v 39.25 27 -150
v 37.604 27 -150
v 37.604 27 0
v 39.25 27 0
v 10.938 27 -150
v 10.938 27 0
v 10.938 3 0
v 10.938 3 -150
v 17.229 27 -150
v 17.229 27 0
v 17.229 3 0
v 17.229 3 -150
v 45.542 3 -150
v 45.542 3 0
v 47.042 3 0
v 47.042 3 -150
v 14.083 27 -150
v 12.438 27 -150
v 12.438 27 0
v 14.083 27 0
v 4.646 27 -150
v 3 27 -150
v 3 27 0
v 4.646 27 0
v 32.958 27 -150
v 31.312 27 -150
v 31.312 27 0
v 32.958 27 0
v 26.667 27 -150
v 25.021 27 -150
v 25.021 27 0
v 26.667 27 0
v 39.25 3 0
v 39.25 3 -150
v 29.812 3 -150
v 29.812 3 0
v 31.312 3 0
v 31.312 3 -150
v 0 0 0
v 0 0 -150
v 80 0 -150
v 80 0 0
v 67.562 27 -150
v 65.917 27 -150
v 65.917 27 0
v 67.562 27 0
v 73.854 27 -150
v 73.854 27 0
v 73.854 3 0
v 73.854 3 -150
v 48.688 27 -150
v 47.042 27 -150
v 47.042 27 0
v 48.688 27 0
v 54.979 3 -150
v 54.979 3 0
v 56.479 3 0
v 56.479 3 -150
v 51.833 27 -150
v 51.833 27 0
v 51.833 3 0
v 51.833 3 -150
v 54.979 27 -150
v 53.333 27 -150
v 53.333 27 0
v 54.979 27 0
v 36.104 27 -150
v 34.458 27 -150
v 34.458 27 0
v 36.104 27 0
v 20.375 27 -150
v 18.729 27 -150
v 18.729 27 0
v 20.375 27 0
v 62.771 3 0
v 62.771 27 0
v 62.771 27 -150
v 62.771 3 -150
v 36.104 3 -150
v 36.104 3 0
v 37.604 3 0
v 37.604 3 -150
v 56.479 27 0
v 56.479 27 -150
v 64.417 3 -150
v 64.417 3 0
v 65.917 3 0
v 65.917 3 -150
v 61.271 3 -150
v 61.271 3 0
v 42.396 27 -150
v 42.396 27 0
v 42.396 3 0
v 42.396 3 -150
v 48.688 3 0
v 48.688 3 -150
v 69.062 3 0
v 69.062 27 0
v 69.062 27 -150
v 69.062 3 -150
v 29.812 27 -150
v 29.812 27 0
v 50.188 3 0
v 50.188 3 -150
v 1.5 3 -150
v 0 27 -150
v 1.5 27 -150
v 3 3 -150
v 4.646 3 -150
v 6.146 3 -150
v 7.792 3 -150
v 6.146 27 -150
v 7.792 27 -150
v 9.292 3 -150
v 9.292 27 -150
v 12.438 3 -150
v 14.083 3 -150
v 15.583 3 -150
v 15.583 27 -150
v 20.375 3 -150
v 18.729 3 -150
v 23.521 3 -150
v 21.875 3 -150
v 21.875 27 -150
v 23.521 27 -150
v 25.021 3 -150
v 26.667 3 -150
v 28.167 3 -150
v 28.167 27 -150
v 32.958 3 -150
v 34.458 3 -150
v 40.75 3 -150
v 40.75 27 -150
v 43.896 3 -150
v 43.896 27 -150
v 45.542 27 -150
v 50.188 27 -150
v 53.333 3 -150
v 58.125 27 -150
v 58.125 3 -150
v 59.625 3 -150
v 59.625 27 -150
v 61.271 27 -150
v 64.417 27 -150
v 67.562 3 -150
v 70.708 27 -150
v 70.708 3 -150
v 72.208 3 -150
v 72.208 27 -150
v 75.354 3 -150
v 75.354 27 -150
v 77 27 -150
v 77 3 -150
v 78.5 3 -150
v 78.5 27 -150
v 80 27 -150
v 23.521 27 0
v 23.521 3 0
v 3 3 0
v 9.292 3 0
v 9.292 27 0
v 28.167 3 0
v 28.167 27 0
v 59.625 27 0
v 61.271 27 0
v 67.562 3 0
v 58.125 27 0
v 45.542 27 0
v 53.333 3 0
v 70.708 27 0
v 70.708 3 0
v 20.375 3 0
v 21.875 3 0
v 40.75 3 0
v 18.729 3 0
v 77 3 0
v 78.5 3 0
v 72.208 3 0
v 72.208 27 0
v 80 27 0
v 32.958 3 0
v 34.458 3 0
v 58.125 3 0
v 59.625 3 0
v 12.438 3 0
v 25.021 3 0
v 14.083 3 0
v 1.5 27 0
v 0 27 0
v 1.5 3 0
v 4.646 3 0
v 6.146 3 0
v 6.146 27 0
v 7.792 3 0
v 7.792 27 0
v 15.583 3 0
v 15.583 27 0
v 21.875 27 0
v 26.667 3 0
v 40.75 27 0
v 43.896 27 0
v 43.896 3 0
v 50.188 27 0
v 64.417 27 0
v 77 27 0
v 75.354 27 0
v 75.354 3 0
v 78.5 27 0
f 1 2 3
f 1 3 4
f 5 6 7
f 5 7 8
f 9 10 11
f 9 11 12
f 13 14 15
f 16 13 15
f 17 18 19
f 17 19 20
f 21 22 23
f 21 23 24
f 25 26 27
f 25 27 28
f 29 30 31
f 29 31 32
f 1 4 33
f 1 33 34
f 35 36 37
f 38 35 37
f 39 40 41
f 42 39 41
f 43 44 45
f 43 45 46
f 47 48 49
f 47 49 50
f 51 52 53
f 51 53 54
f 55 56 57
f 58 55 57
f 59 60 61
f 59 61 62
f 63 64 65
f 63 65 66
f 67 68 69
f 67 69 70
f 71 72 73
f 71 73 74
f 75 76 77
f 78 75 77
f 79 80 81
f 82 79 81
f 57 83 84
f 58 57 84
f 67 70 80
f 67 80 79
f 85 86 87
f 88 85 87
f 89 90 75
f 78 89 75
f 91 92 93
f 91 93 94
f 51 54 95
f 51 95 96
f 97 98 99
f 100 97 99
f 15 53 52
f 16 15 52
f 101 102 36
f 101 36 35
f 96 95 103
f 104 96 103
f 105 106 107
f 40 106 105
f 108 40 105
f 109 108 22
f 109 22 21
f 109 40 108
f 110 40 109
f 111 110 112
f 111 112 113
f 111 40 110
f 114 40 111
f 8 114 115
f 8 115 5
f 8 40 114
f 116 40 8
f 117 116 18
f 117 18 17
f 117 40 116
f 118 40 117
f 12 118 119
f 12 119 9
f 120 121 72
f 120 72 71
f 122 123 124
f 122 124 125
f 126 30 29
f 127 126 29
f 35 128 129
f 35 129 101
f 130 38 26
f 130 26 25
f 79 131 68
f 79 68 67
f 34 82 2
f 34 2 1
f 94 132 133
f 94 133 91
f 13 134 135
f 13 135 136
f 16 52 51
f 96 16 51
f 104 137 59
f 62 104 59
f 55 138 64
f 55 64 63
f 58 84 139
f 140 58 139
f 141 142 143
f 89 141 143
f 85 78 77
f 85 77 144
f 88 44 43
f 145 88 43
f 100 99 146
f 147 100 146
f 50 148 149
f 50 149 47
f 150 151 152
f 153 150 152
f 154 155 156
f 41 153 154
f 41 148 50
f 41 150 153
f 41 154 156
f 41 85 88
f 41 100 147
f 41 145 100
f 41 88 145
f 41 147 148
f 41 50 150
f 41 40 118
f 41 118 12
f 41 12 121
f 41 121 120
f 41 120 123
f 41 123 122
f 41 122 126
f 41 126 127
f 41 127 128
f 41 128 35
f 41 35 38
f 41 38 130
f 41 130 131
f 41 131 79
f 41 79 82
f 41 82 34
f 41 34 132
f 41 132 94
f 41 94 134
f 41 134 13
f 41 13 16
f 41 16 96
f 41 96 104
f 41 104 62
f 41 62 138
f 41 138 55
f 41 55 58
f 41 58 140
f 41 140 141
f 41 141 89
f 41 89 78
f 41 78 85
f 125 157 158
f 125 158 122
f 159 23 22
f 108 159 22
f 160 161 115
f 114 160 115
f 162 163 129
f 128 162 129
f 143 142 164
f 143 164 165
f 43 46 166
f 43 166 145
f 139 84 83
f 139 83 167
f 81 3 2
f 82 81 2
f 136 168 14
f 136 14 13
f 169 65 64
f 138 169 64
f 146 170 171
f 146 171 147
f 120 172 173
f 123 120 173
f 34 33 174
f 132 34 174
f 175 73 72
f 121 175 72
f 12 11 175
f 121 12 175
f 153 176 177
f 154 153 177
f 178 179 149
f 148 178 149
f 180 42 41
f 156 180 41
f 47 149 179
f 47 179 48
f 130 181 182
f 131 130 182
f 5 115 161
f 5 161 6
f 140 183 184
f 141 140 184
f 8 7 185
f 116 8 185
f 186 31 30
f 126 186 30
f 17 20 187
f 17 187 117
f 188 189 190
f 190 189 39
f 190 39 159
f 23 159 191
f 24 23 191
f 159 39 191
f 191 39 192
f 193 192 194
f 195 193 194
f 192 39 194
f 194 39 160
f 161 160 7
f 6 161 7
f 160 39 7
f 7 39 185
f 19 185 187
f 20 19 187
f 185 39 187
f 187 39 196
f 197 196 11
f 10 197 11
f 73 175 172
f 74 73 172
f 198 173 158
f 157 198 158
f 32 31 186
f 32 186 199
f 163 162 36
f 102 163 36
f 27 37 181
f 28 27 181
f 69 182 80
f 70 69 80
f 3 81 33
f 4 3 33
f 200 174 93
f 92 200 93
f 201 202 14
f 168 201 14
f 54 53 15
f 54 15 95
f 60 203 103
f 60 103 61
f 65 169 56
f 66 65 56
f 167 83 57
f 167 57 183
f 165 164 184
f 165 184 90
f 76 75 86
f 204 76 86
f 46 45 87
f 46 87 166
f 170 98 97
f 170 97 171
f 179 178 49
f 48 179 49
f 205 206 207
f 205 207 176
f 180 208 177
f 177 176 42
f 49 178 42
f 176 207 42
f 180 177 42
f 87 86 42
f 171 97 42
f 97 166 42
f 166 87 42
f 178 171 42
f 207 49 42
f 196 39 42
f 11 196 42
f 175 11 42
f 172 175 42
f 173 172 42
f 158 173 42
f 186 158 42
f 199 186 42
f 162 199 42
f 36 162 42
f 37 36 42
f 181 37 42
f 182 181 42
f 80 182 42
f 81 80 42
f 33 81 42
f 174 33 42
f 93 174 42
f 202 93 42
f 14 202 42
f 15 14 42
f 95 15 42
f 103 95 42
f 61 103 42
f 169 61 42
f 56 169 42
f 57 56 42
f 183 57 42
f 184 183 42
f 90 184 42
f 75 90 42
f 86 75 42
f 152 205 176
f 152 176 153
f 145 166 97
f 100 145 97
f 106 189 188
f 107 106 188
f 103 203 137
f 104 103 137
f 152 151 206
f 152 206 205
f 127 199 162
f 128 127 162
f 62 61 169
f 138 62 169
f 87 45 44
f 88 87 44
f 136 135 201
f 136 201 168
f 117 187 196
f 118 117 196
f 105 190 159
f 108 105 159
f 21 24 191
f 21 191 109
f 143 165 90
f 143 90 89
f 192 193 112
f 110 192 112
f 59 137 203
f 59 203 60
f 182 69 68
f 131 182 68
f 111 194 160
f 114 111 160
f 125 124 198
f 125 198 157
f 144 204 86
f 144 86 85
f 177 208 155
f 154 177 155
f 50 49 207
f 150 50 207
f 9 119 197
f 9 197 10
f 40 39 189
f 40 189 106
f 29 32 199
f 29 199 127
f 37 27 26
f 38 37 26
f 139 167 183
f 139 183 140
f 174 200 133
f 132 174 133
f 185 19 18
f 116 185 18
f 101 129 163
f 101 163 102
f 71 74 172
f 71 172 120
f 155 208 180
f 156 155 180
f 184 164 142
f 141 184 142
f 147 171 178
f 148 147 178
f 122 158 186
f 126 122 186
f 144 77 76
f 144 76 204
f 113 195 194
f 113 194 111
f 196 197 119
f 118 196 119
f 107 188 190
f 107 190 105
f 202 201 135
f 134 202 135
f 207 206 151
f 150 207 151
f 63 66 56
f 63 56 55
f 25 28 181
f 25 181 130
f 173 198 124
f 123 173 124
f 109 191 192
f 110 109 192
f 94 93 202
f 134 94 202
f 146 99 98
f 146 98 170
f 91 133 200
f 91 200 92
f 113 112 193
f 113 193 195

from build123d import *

# Parameters (mm, degrees)
SKETCH1_W           = 80
SKETCH1_H           = 150
BOSS_EXTRUDE1_DEPTH = 27
SKETCH2_W           = 1.5
SKETCH2_H           = 150
CUT_EXTRUDE1_DEPTH  = 24


with BuildPart() as part:
    # Sketch1 → Boss-Extrude1 (new body)
    with BuildSketch(Plane(origin=(0, 0, 0), x_dir=(1, 0, 0), z_dir=(0, 1, 0))):
        with Locations((40, 75)):
            Rectangle(SKETCH1_W, SKETCH1_H)
    extrude(amount=BOSS_EXTRUDE1_DEPTH)

    # Sketch2 → Cut-Extrude1 (cut)
    with BuildSketch(Plane(origin=(0, 27, 0), x_dir=(1, 0, 0), z_dir=(0, 1, 0))):
        with Locations((2.25, 75)):
            Rectangle(SKETCH2_W, SKETCH2_H)
        with Locations((5.395833333, 75)):
            Rectangle(SKETCH2_W, SKETCH2_H)
        with Locations((8.541666667, 75)):
            Rectangle(SKETCH2_W, SKETCH2_H)
        with Locations((11.6875, 75)):
            Rectangle(SKETCH2_W, SKETCH2_H)
        with Locations((14.833333333, 75)):
            Rectangle(SKETCH2_W, SKETCH2_H)
        with Locations((17.979166667, 75)):
            Rectangle(SKETCH2_W, SKETCH2_H)
        with Locations((21.125, 75)):
            Rectangle(SKETCH2_W, SKETCH2_H)
        with Locations((24.270833333, 75)):
            Rectangle(SKETCH2_W, SKETCH2_H)
        with Locations((27.416666667, 75)):
            Rectangle(SKETCH2_W, SKETCH2_H)
        with Locations((30.5625, 75)):
            Rectangle(SKETCH2_W, SKETCH2_H)
        with Locations((33.708333333, 75)):
            Rectangle(SKETCH2_W, SKETCH2_H)
        with Locations((36.854166667, 75)):
            Rectangle(SKETCH2_W, SKETCH2_H)
        with Locations((40, 75)):
            Rectangle(SKETCH2_W, SKETCH2_H)
        with Locations((43.145833333, 75)):
            Rectangle(SKETCH2_W, SKETCH2_H)
        with Locations((46.291666667, 75)):
            Rectangle(SKETCH2_W, SKETCH2_H)
        with Locations((49.4375, 75)):
            Rectangle(SKETCH2_W, SKETCH2_H)
        with Locations((52.583333333, 75)):
            Rectangle(SKETCH2_W, SKETCH2_H)
        with Locations((55.729166667, 75)):
            Rectangle(SKETCH2_W, SKETCH2_H)
        with Locations((58.875, 75)):
            Rectangle(SKETCH2_W, SKETCH2_H)
        with Locations((62.020833333, 75)):
            Rectangle(SKETCH2_W, SKETCH2_H)
        with Locations((65.166666667, 75)):
            Rectangle(SKETCH2_W, SKETCH2_H)
        with Locations((68.3125, 75)):
            Rectangle(SKETCH2_W, SKETCH2_H)
        with Locations((71.458333333, 75)):
            Rectangle(SKETCH2_W, SKETCH2_H)
        with Locations((74.604166667, 75)):
            Rectangle(SKETCH2_W, SKETCH2_H)
        with Locations((77.75, 75)):
            Rectangle(SKETCH2_W, SKETCH2_H)
    extrude(amount=-CUT_EXTRUDE1_DEPTH, mode=Mode.SUBTRACT)


solid = part.part
